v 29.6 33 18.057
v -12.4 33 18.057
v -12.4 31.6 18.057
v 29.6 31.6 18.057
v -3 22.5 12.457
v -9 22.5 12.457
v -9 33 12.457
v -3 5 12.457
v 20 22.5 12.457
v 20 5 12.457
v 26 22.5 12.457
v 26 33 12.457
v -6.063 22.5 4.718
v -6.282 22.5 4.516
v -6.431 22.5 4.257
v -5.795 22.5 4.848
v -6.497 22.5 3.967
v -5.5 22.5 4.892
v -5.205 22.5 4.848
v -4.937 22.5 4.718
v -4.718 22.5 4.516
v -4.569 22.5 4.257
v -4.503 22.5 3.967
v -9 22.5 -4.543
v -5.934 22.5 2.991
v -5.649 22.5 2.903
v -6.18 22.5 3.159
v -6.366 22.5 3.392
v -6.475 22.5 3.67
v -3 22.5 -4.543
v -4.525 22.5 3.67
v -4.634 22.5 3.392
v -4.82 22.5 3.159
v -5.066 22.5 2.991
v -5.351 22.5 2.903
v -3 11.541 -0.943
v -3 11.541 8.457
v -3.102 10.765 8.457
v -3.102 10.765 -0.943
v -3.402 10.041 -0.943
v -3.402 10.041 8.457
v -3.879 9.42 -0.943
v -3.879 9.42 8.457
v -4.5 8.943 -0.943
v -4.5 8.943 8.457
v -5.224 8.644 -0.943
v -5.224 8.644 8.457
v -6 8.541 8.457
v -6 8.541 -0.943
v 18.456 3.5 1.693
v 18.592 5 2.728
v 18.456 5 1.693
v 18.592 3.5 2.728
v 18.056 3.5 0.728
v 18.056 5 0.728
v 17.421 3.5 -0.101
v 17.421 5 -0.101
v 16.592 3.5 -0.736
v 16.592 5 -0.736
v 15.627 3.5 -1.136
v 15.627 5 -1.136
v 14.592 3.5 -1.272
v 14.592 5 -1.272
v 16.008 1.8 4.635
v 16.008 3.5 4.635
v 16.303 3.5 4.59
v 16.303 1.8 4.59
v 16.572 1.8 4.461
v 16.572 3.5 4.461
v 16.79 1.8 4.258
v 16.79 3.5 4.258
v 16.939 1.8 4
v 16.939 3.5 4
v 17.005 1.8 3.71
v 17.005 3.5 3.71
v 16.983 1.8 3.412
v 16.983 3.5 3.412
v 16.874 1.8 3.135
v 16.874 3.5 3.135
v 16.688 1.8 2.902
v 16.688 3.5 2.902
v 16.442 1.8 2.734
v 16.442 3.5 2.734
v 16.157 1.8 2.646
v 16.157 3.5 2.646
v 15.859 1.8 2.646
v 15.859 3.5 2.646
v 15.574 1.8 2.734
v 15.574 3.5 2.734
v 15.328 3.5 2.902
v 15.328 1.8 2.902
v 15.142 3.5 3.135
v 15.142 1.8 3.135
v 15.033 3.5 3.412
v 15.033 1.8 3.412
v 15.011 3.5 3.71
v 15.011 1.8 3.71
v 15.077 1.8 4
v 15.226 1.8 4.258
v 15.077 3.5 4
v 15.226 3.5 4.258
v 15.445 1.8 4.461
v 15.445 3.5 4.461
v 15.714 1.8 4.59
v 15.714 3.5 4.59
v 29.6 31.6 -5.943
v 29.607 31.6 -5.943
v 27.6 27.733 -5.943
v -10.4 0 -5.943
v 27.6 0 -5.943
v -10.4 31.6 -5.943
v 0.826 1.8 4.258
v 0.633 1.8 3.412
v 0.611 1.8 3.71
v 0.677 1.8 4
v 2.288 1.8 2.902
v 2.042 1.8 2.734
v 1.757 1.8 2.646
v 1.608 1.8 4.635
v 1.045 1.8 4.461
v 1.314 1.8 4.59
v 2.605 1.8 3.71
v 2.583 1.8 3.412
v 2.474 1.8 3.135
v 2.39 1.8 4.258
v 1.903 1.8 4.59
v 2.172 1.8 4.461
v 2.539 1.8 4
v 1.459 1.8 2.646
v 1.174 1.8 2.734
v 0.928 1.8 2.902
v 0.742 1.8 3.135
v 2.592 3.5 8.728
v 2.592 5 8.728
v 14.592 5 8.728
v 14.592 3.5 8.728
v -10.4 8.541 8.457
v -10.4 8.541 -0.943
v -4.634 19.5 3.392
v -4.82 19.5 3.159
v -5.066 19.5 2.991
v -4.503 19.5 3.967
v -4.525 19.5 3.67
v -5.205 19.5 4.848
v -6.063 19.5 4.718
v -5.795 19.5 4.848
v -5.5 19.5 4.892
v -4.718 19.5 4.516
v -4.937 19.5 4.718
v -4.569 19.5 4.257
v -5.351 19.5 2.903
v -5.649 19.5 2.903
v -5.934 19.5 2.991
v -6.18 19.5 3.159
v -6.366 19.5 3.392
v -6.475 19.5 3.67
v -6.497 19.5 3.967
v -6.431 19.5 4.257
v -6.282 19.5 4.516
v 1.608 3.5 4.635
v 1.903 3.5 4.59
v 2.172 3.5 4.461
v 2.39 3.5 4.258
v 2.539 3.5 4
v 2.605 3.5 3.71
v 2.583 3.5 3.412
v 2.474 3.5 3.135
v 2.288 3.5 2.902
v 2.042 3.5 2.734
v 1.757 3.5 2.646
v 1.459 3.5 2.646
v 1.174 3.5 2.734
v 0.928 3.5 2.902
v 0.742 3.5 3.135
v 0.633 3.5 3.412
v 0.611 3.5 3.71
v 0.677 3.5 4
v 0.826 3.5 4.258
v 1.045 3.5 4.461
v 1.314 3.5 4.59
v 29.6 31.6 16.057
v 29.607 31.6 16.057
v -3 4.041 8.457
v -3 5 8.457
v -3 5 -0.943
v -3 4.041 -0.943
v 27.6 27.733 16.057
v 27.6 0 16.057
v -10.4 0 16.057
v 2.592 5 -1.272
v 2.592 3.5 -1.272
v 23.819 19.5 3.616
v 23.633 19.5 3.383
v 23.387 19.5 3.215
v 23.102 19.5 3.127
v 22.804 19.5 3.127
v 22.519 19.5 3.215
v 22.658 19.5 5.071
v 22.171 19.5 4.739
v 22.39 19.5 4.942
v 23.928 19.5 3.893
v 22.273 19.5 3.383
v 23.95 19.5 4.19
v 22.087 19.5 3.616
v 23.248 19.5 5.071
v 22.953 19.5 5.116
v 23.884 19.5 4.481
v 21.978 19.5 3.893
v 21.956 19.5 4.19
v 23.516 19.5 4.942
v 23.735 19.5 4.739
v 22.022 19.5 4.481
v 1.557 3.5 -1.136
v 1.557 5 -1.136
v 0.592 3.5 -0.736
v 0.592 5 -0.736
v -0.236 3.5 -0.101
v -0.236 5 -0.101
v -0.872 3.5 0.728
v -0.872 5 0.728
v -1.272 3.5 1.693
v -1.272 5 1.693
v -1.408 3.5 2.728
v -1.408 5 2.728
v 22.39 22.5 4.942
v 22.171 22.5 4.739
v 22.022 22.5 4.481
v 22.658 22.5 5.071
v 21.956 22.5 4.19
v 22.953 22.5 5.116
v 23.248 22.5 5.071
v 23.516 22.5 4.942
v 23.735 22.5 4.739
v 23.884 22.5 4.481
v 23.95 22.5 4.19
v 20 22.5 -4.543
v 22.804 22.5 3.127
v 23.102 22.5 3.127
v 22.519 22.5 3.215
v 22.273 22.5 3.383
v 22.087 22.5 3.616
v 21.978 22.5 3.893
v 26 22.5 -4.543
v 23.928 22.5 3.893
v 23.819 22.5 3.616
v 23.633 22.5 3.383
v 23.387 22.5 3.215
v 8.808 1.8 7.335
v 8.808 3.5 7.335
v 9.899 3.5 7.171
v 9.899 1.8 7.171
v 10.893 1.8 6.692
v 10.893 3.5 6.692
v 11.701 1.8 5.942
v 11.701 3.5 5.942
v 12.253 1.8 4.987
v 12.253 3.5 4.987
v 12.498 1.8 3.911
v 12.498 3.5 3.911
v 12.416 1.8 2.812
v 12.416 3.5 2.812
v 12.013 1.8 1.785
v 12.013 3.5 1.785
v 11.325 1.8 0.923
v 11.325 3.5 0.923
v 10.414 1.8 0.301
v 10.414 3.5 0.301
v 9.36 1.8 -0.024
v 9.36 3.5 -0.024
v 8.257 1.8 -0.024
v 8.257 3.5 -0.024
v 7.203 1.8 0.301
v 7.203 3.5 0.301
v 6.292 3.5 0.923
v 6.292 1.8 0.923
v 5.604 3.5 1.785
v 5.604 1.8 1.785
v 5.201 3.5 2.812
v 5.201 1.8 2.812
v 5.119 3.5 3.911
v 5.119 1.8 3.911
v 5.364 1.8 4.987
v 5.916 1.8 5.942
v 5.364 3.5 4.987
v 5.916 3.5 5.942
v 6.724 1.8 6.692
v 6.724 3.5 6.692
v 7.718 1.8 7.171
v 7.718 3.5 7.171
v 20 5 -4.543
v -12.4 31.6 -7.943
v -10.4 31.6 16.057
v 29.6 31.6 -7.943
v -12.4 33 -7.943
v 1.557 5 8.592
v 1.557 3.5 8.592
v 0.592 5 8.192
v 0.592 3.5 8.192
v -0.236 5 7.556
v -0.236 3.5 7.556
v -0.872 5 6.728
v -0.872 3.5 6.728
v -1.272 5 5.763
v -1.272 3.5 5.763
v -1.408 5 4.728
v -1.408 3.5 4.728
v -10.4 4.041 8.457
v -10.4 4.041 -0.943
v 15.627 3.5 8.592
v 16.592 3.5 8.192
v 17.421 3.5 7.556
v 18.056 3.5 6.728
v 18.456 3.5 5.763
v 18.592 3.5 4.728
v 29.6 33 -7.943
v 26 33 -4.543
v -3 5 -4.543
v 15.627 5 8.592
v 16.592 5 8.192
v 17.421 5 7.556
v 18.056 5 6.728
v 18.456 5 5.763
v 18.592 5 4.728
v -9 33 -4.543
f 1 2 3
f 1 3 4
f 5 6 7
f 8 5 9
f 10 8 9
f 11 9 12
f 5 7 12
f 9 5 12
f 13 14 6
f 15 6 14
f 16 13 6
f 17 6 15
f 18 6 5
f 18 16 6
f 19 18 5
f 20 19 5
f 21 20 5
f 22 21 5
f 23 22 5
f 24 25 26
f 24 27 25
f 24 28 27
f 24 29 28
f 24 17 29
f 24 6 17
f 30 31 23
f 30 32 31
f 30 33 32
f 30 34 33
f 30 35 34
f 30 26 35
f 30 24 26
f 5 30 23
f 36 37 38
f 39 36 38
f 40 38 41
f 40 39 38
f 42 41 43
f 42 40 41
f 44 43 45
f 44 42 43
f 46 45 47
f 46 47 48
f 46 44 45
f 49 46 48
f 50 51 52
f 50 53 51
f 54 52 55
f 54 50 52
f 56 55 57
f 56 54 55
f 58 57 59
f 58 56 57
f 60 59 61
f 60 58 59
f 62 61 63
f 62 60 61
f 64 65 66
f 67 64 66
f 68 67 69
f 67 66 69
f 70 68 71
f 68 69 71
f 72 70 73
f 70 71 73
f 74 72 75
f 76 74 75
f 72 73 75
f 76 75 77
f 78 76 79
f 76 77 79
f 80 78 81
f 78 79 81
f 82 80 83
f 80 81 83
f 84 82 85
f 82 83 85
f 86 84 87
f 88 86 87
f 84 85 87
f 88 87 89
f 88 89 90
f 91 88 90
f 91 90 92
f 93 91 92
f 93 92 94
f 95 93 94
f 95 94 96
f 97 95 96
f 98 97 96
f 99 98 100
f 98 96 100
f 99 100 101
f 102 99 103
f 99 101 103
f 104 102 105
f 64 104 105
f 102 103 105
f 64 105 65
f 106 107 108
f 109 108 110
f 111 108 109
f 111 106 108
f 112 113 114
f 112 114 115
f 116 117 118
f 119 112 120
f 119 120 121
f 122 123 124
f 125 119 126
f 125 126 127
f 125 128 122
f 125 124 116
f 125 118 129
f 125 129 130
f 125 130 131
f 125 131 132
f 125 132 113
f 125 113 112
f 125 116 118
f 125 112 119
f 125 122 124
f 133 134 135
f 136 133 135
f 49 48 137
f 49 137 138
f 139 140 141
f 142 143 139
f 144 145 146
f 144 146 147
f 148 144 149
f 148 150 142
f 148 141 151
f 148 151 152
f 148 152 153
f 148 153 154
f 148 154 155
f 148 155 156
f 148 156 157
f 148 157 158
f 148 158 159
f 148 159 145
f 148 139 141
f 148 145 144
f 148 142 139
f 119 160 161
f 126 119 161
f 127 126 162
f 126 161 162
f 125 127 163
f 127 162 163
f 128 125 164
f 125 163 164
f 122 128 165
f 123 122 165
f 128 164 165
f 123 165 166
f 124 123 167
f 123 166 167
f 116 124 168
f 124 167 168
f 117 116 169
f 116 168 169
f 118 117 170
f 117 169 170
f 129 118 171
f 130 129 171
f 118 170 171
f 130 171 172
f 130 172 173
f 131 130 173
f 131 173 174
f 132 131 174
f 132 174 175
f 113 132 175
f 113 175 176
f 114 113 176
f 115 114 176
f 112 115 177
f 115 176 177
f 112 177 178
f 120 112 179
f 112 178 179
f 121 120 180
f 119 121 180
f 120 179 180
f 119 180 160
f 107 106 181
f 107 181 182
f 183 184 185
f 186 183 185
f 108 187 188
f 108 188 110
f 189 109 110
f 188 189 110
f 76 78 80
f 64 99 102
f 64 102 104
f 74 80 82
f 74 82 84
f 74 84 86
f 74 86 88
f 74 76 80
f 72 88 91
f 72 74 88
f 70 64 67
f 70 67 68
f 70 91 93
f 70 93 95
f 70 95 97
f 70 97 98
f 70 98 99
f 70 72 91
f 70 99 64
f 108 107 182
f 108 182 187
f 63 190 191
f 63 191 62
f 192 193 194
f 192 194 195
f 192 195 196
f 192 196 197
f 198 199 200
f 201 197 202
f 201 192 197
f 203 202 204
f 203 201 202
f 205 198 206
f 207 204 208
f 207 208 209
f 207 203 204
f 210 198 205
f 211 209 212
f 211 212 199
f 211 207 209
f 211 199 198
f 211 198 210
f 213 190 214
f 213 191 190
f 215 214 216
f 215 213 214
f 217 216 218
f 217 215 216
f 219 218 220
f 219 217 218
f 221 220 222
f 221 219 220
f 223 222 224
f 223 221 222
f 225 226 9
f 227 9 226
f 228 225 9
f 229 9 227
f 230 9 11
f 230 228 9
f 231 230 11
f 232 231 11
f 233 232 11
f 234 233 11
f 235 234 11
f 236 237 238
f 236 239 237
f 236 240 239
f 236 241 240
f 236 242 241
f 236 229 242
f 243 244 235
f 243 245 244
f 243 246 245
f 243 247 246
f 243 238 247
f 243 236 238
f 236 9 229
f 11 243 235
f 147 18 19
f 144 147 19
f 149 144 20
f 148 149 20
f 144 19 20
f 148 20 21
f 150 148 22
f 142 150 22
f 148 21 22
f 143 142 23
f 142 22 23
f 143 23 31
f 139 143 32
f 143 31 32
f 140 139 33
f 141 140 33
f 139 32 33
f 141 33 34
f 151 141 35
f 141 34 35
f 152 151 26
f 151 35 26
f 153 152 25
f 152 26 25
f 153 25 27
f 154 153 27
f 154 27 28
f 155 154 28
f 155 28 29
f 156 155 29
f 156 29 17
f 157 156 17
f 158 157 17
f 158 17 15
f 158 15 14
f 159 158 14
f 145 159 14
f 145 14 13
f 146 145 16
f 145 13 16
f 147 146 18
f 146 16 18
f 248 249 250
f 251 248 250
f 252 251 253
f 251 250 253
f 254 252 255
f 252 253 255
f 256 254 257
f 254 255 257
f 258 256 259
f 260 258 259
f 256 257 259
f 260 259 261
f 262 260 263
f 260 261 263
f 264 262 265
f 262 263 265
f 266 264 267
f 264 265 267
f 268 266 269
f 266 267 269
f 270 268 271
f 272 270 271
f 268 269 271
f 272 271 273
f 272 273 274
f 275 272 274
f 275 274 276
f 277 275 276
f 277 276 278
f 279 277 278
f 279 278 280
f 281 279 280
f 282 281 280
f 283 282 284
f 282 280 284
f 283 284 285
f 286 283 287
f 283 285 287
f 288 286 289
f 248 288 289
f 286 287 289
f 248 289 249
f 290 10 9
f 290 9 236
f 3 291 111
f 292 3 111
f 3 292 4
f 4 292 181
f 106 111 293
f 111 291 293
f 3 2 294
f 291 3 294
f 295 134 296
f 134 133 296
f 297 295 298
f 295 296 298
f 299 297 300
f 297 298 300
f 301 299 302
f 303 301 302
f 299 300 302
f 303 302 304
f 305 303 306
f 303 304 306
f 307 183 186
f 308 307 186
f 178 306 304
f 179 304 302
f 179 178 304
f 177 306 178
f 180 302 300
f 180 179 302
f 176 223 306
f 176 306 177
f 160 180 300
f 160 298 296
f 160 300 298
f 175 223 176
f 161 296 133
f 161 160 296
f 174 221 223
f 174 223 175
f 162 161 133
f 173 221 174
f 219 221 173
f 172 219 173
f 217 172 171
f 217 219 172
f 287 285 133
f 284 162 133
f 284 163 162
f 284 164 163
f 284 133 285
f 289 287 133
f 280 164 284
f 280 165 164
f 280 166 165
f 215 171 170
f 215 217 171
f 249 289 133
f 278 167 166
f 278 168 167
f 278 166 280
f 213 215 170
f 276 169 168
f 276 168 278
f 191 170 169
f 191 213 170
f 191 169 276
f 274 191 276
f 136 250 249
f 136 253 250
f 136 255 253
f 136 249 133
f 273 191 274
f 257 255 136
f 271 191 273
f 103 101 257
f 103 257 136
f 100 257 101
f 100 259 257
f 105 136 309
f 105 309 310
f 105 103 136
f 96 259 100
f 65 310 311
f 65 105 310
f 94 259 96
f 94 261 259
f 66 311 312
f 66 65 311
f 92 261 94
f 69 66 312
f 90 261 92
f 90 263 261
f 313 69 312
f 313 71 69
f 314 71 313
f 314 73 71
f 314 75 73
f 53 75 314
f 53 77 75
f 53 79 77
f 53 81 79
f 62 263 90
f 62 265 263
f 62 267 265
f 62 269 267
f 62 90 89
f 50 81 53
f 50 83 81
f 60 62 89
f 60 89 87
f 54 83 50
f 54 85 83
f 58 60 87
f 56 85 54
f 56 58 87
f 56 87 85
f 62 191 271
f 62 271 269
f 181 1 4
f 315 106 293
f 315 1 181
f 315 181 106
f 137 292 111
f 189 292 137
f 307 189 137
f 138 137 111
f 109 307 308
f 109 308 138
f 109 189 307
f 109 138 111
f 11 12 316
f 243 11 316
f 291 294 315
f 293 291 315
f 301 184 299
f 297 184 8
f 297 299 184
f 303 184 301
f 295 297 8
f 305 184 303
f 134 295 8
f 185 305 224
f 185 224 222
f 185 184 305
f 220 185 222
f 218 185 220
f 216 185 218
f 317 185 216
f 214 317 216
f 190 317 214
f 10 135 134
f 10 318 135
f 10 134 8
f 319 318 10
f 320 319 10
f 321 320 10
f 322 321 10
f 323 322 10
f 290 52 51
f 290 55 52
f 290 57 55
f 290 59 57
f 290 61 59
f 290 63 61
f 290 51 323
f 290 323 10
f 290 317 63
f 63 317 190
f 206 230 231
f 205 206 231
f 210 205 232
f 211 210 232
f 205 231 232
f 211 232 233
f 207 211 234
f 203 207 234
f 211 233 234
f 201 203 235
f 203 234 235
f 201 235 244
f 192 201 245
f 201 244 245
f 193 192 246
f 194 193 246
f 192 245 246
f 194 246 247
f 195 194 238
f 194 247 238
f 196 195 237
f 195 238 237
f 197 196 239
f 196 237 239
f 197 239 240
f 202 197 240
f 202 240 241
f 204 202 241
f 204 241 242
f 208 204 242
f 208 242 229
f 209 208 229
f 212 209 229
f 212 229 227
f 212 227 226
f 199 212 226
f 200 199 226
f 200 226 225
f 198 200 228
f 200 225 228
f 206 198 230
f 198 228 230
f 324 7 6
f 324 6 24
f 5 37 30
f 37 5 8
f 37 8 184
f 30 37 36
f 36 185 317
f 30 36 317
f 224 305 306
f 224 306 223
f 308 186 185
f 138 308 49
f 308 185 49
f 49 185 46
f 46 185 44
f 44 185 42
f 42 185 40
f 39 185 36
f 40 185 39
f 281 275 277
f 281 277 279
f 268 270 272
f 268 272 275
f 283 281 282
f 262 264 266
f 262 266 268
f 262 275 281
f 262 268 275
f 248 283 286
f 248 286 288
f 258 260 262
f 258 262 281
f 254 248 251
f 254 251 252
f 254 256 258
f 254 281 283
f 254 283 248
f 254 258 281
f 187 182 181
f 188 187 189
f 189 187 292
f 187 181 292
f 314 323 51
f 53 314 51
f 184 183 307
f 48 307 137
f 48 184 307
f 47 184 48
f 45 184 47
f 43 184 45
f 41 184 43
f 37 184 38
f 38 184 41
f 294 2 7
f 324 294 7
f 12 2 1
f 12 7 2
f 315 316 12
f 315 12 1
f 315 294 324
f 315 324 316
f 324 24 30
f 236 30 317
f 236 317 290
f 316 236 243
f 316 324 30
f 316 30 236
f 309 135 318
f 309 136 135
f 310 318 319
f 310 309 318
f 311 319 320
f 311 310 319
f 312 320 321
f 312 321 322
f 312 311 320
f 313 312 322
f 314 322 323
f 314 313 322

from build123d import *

# Parameters (mm, degrees)
SKETCH1_W           = 38
SKETCH1_H           = 22
BOSS_EXTRUDE1_DEPTH = 33
SKETCH2_W           = 35
SKETCH2_H           = 17
CUT_EXTRUDE1_DEPTH  = 28
SKETCH3_W           = 6
SKETCH3_H           = 17
BOSS_EXTRUDE2_DEPTH = 17.5
SKETCH4_W           = 42
SKETCH4_H           = 26
SKETCH4_W_2         = 38
SKETCH4_H_2         = 22
EXTRUDE_THIN2_DEPTH = 1.4
SKETCH5_R           = 1
CUT_EXTRUDE2_DEPTH  = 3
SKETCH6_R           = 1
CUT_EXTRUDE3_DEPTH  = 3
SKETCH7_W           = 9.4
SKETCH7_H           = 4.5
CUT_EXTRUDE4_DEPTH  = 10
SKETCH8_W           = 20
SKETCH8_H           = 10
CUT_EXTRUDE5_DEPTH  = 1.5
SKETCH9_R           = 3.7
SKETCH9_R_2         = 1
CUT_EXTRUDE6_DEPTH  = 1.7
FILLET1_R           = 4
BOSS_EXTRUDE3_START = -22
BOSS_EXTRUDE3_DEPTH = 22
FILLET2_R           = 3


with BuildPart() as part:
    # Sketch1 → Boss-Extrude1 (new body)
    with BuildSketch(Plane(origin=(0, 0, 0), x_dir=(1, 0, 0), z_dir=(0, 1, 0))):
        with Locations((8.6, -5.057142857)):
            Rectangle(SKETCH1_W, SKETCH1_H)
    extrude(amount=BOSS_EXTRUDE1_DEPTH)

    # Sketch2 → Cut-Extrude1 (cut)
    with BuildSketch(Plane(origin=(0, 33, 0), x_dir=(1, 0, 0), z_dir=(0, 1, 0))):
        with Locations((8.5, -3.957142857)):
            Rectangle(SKETCH2_W, SKETCH2_H)
    extrude(amount=-CUT_EXTRUDE1_DEPTH, mode=Mode.SUBTRACT)

    # Sketch3 → Boss-Extrude2 (add)
    with BuildSketch(Plane(origin=(0, 5, 0), x_dir=(1, 0, 0), z_dir=(0, 1, 0))):
        with Locations((-6, -3.957142857)):
            Rectangle(SKETCH3_W, SKETCH3_H)
        with Locations((23, -3.957142857)):
            Rectangle(SKETCH3_W, SKETCH3_H)
    extrude(amount=BOSS_EXTRUDE2_DEPTH)

    # Sketch4 → Extrude-Thin2 (add)
    with BuildSketch(Plane(origin=(0, 33, 0), x_dir=(1, 0, 0), z_dir=(0, 1, 0))):
        with Locations((8.6, -5.057142857)):
            Rectangle(SKETCH4_W, SKETCH4_H)
        with Locations((8.6, -5.057142857)):
            Rectangle(SKETCH4_W_2, SKETCH4_H_2, mode=Mode.SUBTRACT)
    extrude(amount=-EXTRUDE_THIN2_DEPTH)

    # Sketch5 → Cut-Extrude2 (cut)
    with BuildSketch(Plane(origin=(0, 22.5, 0), x_dir=(1, 0, 0), z_dir=(0, 1, 0))):
        with Locations(Location((-5.5, -3.892148731, 0), (0, 0, 270))):
            Circle(SKETCH5_R)
    extrude(amount=-CUT_EXTRUDE2_DEPTH, mode=Mode.SUBTRACT)

    # Sketch6 → Cut-Extrude3 (cut)
    with BuildSketch(Plane(origin=(0, 22.5, 0), x_dir=(1, 0, 0), z_dir=(0, 1, 0))):
        with Locations(Location((22.953148274, -4.115727136, 0), (0, 0, 270))):
            Circle(SKETCH6_R)
    extrude(amount=-CUT_EXTRUDE3_DEPTH, mode=Mode.SUBTRACT)

    # Sketch7 → Cut-Extrude4 (cut)
    with BuildSketch(Plane(origin=(-3, 0, 0), x_dir=(0, 0, -1), z_dir=(1, 0, 0))):
        with Locations((-3.757142857, 6.291369126)):
            Rectangle(SKETCH7_W, SKETCH7_H)
    extrude(amount=-CUT_EXTRUDE4_DEPTH, mode=Mode.SUBTRACT)

    # Sketch8 → Cut-Extrude5 (cut)
    with BuildSketch(Plane(origin=(0, 5, 0), x_dir=(1, 0, 0), z_dir=(0, 1, 0))):
        with Locations((8.592117784, -3.72787339)):
            Rectangle(SKETCH8_W, SKETCH8_H)
    extrude(amount=-CUT_EXTRUDE5_DEPTH, mode=Mode.SUBTRACT)

    # Sketch9 → Cut-Extrude6 (cut)
    with BuildSketch(Plane(origin=(0, 3.5, 0), x_dir=(1, 0, 0), z_dir=(0, 1, 0))):
        with Locations(Location((8.808284604, -3.634888569, 0), (0, 0, 270))):
            Circle(SKETCH9_R)
        with Locations(Location((1.608284604, -3.634888569, 0), (0, 0, 270))):
            Circle(SKETCH9_R_2)
        with Locations(Location((16.008284604, -3.634888569, 0), (0, 0, 270))):
            Circle(SKETCH9_R_2)
    extrude(amount=-CUT_EXTRUDE6_DEPTH, mode=Mode.SUBTRACT)

    # Fillet1
    fillet1_edges = [part.edges().sort_by_distance(p)[0] for p in [
        (-1.407882216, 4.25, 8.72787339),
        (-1.407882216, 4.25, -1.27212661),
        (18.592117784, 4.25, -1.27212661),
        (18.592117784, 4.25, 8.72787339),
    ]]
    fillet(fillet1_edges, radius=FILLET1_R)

    # Sketch10 → Boss-Extrude3 (add)
    with BuildSketch(Plane.XY.offset(16.057142857).offset(BOSS_EXTRUDE3_START)):
        Polygon((27.6, 31.6), (29.607360767, 31.6), (27.6, 27.732810295), align=None)
    extrude(amount=BOSS_EXTRUDE3_DEPTH)

    # Fillet2
    fillet2_edges = [part.edges().sort_by_distance(p)[0] for p in [
        (-3, 8.541369126, 3.757142857),
    ]]
    fillet(fillet2_edges, radius=FILLET2_R)


solid = part.part
